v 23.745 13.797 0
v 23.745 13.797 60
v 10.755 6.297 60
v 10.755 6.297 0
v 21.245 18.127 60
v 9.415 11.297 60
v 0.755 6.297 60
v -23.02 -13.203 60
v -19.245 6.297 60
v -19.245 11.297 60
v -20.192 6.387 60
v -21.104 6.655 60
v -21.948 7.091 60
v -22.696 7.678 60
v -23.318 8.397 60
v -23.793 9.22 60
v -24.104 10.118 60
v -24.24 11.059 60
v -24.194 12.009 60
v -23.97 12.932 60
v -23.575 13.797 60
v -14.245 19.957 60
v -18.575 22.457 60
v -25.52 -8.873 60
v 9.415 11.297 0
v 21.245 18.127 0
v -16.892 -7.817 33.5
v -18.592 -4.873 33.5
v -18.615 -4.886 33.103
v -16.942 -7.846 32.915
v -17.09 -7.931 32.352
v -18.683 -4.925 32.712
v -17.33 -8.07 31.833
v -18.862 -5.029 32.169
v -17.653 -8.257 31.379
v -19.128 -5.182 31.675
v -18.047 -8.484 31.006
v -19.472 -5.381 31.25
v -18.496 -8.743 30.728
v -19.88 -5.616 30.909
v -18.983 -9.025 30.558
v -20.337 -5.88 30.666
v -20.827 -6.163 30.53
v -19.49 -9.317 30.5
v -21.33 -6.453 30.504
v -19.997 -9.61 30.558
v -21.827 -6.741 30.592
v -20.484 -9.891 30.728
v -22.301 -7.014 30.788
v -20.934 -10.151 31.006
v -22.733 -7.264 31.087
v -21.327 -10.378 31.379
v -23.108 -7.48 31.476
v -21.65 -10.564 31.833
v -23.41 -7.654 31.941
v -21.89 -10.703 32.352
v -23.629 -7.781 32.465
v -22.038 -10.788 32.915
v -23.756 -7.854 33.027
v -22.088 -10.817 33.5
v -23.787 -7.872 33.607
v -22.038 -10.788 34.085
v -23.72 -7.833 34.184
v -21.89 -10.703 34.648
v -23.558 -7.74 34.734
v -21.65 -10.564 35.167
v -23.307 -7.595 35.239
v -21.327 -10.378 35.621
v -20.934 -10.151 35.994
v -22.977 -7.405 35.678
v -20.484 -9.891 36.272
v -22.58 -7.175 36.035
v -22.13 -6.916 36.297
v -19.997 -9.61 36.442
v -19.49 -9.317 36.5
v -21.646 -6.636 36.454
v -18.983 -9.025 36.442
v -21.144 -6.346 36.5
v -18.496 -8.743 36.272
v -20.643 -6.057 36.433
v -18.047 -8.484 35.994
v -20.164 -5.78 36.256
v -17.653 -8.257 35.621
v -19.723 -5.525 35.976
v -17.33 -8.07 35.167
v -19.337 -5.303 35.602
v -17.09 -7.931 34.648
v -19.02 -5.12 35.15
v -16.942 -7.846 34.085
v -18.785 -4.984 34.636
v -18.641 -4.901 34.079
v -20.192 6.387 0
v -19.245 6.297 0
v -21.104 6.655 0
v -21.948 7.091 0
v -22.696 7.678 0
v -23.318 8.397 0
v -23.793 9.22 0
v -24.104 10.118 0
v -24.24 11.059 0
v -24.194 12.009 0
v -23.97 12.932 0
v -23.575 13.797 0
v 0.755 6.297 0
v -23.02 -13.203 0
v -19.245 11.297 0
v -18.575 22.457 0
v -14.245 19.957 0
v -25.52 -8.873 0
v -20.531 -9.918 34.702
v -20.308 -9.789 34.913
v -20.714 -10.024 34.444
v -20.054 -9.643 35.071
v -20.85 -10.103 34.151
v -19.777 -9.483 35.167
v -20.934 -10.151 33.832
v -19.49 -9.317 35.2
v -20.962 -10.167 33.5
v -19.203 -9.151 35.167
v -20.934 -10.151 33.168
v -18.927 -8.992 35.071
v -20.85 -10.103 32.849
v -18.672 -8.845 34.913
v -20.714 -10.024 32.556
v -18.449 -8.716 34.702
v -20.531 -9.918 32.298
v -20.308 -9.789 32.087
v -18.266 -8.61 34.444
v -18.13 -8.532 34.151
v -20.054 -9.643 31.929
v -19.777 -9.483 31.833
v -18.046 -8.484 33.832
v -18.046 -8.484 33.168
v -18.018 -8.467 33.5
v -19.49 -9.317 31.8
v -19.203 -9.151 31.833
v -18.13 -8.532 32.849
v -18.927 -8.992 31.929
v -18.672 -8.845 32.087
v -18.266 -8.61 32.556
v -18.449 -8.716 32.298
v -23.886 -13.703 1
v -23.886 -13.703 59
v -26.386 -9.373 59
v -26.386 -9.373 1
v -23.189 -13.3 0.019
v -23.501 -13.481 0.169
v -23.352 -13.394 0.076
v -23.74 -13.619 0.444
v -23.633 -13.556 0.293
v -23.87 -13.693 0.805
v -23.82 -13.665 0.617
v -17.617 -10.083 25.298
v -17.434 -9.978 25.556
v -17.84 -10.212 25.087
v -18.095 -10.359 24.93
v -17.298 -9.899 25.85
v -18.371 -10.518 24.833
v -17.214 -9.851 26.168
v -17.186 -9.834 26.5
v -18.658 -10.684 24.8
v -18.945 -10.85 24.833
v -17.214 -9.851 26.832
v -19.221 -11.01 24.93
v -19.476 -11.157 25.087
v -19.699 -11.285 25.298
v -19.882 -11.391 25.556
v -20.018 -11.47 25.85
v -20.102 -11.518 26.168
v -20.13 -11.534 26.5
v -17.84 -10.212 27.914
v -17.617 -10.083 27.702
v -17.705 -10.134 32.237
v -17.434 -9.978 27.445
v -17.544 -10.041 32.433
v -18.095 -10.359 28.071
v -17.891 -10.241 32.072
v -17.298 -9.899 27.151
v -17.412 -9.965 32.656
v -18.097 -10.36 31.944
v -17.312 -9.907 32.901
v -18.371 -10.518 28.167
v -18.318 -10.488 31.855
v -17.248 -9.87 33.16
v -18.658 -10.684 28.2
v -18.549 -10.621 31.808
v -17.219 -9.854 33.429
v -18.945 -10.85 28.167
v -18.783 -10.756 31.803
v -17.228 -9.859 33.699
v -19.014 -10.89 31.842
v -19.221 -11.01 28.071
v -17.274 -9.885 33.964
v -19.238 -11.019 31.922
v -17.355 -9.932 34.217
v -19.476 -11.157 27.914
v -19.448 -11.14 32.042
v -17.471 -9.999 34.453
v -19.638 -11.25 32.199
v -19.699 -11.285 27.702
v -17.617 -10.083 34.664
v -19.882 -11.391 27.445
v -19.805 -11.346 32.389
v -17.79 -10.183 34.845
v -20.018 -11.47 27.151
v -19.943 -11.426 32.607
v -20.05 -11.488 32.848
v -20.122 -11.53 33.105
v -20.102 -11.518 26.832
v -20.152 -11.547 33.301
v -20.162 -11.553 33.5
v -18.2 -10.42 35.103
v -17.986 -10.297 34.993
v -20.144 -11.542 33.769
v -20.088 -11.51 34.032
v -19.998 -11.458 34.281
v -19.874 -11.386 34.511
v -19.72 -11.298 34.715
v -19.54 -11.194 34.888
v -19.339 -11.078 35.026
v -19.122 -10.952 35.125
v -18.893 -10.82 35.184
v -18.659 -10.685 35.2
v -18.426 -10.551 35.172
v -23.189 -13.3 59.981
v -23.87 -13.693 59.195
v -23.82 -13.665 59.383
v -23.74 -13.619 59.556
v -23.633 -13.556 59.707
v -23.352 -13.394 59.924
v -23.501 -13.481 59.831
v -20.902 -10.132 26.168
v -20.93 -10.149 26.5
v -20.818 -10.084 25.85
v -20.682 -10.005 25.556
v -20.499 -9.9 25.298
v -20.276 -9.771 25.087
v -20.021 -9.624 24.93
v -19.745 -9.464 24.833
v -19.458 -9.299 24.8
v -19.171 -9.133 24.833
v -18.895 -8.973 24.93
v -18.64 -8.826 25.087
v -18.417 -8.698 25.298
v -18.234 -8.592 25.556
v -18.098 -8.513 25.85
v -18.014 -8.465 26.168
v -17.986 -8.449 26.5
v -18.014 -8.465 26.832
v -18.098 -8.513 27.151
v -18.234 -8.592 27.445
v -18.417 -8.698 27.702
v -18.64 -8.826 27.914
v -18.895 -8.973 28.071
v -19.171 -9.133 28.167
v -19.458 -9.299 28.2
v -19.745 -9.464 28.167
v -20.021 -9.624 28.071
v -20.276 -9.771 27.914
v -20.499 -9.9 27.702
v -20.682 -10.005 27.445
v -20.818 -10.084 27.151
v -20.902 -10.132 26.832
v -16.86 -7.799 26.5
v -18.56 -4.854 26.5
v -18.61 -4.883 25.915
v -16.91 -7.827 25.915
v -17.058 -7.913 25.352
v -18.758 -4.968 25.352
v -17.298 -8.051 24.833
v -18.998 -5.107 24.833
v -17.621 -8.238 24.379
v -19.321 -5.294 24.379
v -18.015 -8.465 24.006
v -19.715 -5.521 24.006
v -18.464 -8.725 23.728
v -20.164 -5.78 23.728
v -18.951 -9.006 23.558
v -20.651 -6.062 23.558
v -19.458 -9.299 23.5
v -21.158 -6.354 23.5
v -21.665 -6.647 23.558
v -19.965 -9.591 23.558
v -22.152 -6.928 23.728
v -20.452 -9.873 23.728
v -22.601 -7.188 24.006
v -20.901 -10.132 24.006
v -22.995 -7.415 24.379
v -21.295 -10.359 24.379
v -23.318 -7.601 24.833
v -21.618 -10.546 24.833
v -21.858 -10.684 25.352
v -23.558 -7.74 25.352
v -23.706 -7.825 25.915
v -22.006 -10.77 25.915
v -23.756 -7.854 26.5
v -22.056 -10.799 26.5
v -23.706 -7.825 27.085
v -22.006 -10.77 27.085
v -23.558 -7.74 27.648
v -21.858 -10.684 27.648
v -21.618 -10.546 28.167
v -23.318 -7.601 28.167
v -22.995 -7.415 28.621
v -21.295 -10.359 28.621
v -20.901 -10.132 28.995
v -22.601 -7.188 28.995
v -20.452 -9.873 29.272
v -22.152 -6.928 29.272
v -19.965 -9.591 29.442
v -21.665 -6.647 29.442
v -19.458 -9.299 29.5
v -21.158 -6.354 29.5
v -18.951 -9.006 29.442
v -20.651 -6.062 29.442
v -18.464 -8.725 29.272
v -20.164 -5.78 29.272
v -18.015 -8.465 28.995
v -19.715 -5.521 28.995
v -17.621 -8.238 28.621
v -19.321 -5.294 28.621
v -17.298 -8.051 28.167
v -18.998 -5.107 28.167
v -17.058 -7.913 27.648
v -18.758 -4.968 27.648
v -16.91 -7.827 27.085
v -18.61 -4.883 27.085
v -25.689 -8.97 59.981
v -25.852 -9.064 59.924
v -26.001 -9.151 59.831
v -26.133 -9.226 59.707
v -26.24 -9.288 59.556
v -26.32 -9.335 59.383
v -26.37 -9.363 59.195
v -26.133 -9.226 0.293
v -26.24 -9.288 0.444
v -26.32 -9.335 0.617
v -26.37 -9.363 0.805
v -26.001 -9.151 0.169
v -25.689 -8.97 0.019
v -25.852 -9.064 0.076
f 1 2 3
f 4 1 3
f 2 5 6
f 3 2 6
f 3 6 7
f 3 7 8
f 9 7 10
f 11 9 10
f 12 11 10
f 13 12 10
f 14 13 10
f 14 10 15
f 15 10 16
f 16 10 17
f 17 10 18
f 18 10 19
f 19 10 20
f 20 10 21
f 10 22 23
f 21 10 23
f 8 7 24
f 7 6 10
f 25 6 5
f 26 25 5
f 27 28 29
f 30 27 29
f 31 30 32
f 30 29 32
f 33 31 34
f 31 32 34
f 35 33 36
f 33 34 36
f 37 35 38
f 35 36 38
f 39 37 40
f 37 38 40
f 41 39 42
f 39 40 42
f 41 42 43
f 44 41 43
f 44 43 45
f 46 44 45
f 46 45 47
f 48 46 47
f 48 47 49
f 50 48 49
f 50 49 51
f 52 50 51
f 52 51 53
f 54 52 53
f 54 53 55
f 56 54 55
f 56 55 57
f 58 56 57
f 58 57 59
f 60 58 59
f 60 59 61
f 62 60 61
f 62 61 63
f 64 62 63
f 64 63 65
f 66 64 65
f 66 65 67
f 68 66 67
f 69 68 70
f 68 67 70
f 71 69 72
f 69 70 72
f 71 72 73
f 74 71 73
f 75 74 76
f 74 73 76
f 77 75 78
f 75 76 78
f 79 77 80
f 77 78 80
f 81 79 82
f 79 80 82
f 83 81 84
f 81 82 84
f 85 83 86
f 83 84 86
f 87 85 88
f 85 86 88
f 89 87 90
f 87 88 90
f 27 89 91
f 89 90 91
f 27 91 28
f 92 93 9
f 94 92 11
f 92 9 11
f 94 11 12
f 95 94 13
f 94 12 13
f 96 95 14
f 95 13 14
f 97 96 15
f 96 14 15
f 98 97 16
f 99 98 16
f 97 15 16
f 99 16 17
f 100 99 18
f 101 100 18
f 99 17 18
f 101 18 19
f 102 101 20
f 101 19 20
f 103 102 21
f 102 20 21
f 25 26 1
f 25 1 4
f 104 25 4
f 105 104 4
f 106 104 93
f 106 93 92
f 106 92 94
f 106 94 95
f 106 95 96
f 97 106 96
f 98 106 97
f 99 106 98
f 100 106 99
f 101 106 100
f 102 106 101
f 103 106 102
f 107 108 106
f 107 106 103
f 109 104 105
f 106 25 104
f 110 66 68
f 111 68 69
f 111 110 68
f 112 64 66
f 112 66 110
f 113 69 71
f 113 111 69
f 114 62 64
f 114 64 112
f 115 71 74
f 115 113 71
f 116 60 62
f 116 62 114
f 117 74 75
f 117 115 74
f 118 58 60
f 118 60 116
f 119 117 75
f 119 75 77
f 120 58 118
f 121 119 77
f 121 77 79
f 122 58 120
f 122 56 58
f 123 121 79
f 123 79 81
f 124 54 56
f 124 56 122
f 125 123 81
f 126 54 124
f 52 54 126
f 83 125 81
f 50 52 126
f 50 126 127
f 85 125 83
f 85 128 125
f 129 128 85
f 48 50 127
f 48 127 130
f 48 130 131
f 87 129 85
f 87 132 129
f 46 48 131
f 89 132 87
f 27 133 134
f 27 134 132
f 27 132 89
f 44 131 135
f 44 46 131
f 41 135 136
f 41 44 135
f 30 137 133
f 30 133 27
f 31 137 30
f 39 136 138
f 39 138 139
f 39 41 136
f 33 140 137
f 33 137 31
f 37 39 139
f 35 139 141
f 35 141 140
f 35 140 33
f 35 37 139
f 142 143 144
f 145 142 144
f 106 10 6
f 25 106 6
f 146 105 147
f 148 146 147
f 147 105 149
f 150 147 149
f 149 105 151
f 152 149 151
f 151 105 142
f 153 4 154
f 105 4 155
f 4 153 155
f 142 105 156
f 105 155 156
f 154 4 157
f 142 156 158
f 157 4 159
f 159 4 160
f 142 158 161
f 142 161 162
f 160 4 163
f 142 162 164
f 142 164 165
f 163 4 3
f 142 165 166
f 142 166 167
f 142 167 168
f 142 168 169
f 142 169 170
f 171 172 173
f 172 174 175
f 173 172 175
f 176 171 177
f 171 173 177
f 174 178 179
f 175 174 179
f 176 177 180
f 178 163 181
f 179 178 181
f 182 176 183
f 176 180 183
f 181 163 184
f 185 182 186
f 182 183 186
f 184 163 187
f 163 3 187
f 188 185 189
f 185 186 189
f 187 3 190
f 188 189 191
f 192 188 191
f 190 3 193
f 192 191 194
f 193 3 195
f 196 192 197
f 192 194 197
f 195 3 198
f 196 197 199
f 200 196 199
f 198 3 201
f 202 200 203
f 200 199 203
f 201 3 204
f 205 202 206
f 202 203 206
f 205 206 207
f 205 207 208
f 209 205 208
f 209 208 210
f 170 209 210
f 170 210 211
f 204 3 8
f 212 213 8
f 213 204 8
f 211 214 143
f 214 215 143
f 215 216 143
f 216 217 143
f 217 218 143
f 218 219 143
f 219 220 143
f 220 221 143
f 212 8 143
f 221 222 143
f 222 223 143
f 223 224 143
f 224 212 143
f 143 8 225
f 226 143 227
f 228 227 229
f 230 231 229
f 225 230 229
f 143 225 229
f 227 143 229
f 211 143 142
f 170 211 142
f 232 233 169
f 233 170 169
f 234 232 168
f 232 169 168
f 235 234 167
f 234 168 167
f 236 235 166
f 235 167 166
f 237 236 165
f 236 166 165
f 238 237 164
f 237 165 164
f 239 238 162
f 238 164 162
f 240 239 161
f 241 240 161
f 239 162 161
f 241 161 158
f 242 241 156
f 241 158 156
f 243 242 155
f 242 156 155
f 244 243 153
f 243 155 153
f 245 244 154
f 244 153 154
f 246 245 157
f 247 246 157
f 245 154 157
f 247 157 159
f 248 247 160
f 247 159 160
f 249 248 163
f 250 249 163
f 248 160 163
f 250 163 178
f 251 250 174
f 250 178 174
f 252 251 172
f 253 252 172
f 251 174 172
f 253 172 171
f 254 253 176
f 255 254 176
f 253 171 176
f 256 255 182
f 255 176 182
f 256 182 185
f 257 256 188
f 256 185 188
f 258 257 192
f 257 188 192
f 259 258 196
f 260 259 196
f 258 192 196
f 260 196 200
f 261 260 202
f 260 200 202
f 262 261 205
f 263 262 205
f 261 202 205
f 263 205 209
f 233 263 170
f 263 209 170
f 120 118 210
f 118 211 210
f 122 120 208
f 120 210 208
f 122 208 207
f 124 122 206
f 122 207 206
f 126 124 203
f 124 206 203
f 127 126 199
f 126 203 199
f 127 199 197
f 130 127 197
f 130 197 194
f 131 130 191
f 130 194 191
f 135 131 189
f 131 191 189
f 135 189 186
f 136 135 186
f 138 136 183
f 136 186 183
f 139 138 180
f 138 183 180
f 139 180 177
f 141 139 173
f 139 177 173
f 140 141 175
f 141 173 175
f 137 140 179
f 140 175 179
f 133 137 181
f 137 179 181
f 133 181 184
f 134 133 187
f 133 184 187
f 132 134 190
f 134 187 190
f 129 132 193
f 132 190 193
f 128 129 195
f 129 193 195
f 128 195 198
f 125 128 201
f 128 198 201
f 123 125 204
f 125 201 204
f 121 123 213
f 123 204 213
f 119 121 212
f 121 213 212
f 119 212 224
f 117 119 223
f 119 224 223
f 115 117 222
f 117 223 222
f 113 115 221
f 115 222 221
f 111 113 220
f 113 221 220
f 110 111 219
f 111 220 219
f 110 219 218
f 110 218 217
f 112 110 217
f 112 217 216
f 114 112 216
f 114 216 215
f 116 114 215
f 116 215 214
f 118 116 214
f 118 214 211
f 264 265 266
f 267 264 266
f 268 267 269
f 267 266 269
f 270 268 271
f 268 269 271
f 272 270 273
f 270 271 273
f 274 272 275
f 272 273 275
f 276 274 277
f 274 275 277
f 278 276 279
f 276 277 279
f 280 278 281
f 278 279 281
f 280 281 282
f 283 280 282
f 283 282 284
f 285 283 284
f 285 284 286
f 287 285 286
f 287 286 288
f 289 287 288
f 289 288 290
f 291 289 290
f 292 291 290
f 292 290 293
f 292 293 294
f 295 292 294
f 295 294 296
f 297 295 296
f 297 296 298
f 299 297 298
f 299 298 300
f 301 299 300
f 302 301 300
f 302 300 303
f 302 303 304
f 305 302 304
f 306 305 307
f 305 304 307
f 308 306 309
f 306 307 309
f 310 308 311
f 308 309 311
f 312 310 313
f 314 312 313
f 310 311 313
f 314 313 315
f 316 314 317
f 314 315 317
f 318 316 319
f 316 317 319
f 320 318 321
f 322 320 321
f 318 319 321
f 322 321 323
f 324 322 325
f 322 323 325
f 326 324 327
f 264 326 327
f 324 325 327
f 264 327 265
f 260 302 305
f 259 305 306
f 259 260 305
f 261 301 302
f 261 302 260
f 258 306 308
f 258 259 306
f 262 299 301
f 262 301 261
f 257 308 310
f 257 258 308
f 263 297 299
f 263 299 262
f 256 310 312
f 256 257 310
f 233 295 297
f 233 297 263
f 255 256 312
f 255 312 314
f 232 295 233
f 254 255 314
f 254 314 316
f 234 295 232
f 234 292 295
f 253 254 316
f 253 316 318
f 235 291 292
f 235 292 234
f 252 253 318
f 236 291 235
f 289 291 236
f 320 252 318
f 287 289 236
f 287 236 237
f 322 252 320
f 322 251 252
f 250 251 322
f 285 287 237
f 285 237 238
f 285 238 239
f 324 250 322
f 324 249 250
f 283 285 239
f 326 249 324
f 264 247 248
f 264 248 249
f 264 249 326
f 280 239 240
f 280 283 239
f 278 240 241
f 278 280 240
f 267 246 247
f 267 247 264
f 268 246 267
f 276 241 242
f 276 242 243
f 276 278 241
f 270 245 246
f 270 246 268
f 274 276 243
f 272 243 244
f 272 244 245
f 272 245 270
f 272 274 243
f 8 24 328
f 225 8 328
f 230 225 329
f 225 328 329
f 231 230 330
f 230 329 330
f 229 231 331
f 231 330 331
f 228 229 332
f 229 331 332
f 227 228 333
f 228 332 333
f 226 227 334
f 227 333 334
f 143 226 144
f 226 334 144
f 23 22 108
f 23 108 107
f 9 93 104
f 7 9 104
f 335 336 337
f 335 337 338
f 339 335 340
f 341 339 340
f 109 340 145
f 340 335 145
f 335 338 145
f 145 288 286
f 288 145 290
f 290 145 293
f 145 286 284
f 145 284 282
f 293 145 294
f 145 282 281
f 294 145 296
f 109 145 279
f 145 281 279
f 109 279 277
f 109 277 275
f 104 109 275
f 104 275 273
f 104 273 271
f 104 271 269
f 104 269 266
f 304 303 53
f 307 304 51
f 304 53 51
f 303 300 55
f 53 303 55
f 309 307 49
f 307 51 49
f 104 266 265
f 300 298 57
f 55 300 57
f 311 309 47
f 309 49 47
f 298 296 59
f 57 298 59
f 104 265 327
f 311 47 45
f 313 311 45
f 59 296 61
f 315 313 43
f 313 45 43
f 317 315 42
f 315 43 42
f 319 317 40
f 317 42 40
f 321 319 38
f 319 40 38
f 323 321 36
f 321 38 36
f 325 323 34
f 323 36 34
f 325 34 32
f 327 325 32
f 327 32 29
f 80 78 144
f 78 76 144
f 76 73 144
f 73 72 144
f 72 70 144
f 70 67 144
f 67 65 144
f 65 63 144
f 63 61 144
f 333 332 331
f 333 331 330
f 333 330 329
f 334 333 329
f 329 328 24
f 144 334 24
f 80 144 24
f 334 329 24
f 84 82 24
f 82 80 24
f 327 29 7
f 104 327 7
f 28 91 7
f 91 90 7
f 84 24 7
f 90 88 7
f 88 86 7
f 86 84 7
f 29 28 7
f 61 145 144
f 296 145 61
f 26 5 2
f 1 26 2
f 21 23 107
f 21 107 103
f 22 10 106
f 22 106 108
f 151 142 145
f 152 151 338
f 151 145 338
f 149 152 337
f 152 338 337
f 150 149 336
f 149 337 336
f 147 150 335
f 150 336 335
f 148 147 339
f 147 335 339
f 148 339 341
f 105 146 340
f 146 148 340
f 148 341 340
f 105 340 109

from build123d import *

# Parameters (mm, degrees)
SKETCH_1_W                          = 30
SKETCH_1_H                          = 5
EXTRUDE_1_DEPTH                     = 60
EXTRUDE_2_DEPTH                     = 60
EXTRUDE_3_DEPTH                     = 60
EXTRUDE_4_DEPTH                     = 60
HOLE_WIZARD_1_D                     = 3.4
HOLE_WIZARD_1_CBORE_D               = 6
HOLE_WIZARD_1_CBORE_DEPTH           = 3.4
HOLE_WIZARD_1_ON_FACE_2_D           = 3.4
HOLE_WIZARD_1_ON_FACE_2_CBORE_D     = 6
HOLE_WIZARD_1_ON_FACE_2_CBORE_DEPTH = 3.4
CUT_EXTRUDE_1_DEPTH                 = 60
CUT_EXTRUDE_2_DEPTH                 = 60


with BuildPart() as part:
    # 草图1 → 凸台-拉伸1 (new body)
    with BuildSketch(Plane.XY):
        with Locations((-4.245283019, 8.79713097)):
            Rectangle(SKETCH_1_W, SKETCH_1_H)
    extrude(amount=EXTRUDE_1_DEPTH)



with BuildPart() as body_2:
    # 草图2 → 凸台-拉伸2 (new body)
    with BuildSketch(Plane.XY.offset(60)):
        Polygon((-19.245283019, 11.29713097), (-14.245283019, 19.957385008), (-18.575410038, 22.457385008), (-23.575410038, 13.79713097), align=None)
    extrude(amount=-EXTRUDE_2_DEPTH)


with BuildPart() as part_1:
    add(part.part)

    add(body_2.part)  # 凸台-拉伸3 merges body 2
    # 草图3 → 凸台-拉伸3 (add)
    with BuildSketch(Plane.XY.offset(60)):
        with BuildLine():
            Line((-23.575410038, 13.79713097), (-19.245283019, 11.29713097))
            Line((-19.245283019, 11.29713097), (-19.245283019, 6.29713097))
            ThreePointArc((-19.245283019, 6.29713097), (-23.575410038, 8.79713097), (-23.575410038, 13.79713097))
        make_face()
    extrude(amount=-EXTRUDE_3_DEPTH)

    # 草图4 → 凸台-拉伸4 (add)
    with BuildSketch(Plane.XY.offset(60)):
        Polygon((10.754716981, 6.29713097), (-23.88629917, -13.70286903), (-26.38629917, -9.372742011), (8.254716981, 10.627257989), (21.245098038, 18.127257989), (23.745098038, 13.79713097), align=None)
    extrude(amount=-EXTRUDE_4_DEPTH)

    # 打孔尺寸(%根据)内六角圆柱头螺钉的类型1 (through all)
    with Locations(Plane(origin=(-21.157984096, -6.354172895, 26.500098518), x_dir=(0.866025403784, 0.5, 0), z_dir=(-0.5, 0.866025403784, 0))):
        with Locations((0, 0)):
            CounterBoreHole(HOLE_WIZARD_1_D / 2, HOLE_WIZARD_1_CBORE_D / 2, HOLE_WIZARD_1_CBORE_DEPTH)

    # 打孔尺寸(%根据)内六角圆柱头螺钉的类型1 on face 2 (through all)
    with Locations(Plane(origin=(-21.190146748, -6.372742011, 33.5), x_dir=(0.866025302838, 0.500000174844, 0), z_dir=(-0.500000174844, 0.866025302838, 0))):
        with Locations((0, 0)):
            CounterBoreHole(HOLE_WIZARD_1_ON_FACE_2_D / 2, HOLE_WIZARD_1_ON_FACE_2_CBORE_D / 2, HOLE_WIZARD_1_ON_FACE_2_CBORE_DEPTH)

    # 草图7 → 切除-拉伸1 (cut)
    with BuildSketch(Plane(origin=(-2.53805845, 4.396046189, 0), x_dir=(0.8660254037844416, 0.499999999999995, 0), z_dir=(-0.499999999999995, 0.8660254037844416, 0))):
        with BuildLine():
            Line((-26.537576399, 0), (-27.537576399, 0))
            Line((-27.537576399, 0), (-27.537576399, -1))
            ThreePointArc((-27.537576399, -1), (-27.24468318, -0.292893219), (-26.537576399, 0))
        make_face()
    extrude(amount=-CUT_EXTRUDE_1_DEPTH, mode=Mode.SUBTRACT)

    # 草图9 → 切除-拉伸2 (cut)
    with BuildSketch(Plane(origin=(-2.53805845, 4.396046189, 0), x_dir=(0.8660254037844416, 0.499999999999995, 0), z_dir=(-0.499999999999995, 0.8660254037844416, 0))):
        with BuildLine():
            Line((-27.537576399, -59), (-27.537576399, -60))
            Line((-27.537576399, -60), (-26.537576399, -60))
            ThreePointArc((-26.537576399, -60), (-27.24468318, -59.707106781), (-27.537576399, -59))
        make_face()
    extrude(amount=-CUT_EXTRUDE_2_DEPTH, mode=Mode.SUBTRACT)


solid = part_1.part
